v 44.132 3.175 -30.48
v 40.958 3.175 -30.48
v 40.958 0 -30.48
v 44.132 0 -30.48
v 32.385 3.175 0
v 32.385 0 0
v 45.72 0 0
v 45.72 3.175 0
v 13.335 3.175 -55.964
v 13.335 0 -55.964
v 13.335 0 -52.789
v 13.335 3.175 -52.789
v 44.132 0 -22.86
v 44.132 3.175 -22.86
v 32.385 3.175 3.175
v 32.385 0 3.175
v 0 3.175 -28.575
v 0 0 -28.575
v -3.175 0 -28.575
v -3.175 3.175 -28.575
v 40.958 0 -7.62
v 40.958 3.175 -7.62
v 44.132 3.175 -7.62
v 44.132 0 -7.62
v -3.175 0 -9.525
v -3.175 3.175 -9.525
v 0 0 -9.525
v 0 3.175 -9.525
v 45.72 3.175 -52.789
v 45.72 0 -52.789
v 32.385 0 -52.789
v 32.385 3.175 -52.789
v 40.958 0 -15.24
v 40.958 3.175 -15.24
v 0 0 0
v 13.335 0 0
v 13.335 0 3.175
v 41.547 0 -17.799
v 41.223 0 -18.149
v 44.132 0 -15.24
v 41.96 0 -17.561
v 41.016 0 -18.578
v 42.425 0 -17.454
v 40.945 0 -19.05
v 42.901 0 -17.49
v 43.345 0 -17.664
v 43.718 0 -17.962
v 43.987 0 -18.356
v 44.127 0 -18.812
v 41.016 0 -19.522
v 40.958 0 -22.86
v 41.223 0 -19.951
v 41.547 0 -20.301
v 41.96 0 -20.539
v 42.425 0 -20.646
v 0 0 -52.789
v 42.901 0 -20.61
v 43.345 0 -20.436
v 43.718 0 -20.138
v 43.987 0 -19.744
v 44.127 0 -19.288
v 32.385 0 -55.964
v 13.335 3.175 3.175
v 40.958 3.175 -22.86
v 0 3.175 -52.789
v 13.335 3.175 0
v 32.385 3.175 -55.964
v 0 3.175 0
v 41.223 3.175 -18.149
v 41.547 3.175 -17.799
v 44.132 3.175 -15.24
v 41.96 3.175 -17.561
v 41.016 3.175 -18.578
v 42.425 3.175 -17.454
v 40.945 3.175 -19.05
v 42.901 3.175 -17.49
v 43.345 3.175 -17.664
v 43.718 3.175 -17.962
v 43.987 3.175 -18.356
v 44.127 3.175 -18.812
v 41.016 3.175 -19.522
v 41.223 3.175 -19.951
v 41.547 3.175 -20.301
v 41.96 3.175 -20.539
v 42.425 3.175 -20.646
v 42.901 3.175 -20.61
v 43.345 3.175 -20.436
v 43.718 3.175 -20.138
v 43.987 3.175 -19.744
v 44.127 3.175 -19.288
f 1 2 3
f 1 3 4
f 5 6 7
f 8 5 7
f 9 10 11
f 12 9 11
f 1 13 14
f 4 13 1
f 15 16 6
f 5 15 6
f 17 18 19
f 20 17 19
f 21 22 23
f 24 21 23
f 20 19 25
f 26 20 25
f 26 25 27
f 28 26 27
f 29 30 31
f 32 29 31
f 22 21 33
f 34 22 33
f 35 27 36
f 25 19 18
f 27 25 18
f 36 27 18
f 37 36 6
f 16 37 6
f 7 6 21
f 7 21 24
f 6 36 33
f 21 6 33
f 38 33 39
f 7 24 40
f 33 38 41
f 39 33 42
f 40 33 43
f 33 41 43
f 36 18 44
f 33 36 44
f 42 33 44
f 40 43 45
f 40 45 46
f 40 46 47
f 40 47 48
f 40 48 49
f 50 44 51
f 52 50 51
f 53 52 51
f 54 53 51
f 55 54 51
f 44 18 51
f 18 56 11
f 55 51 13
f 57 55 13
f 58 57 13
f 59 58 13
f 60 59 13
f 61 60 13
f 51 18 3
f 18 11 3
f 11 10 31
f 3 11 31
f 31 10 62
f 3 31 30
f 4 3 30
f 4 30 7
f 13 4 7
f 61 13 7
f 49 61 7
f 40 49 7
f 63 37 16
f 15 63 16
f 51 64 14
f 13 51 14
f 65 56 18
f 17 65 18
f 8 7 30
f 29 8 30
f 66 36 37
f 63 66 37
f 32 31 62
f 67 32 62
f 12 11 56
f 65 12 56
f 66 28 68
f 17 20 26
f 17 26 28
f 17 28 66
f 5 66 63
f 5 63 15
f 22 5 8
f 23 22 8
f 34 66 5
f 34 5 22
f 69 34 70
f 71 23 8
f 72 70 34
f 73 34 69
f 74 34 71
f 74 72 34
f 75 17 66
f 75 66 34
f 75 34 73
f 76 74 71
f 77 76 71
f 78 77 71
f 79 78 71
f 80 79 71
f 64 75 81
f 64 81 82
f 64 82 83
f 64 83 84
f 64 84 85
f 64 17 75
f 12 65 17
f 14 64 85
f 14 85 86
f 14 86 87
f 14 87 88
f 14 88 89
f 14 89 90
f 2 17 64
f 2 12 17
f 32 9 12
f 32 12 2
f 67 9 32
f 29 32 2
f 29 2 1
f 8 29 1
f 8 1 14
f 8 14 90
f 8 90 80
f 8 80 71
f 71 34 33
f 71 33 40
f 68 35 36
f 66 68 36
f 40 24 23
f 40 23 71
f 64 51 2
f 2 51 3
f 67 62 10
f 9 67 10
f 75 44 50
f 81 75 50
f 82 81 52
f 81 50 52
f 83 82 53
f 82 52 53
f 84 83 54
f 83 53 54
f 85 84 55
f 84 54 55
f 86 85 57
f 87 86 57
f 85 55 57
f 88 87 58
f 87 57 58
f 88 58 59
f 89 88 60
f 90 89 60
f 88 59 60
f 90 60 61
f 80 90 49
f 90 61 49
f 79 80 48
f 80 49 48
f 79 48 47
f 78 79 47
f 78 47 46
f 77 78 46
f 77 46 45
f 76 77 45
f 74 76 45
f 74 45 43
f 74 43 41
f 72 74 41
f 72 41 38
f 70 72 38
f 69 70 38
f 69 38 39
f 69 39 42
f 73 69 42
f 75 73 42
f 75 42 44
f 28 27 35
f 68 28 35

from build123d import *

# Parameters (mm, degrees)
SKETCH1_W            = 3.175
SKETCH1_H            = 7.62
BOSS_EXTRUDE1_DEPTH  = 3.175
M3_CLEARANCE_HOLE1_D = 3.2


with BuildPart() as part:
    # Sketch1 → Boss-Extrude1 (new body)
    with BuildSketch(Plane(origin=(0, 0, 0), x_dir=(1, 0, 0), z_dir=(0, 1, 0))):
        Polygon((0, 0), (13.335, 0), (13.335, -3.175), (32.385, -3.175), (32.385, 0), (45.72, 0), (45.72, 52.78882), (32.385, 52.78882), (32.385, 55.96382), (13.335, 55.96382), (13.335, 52.78882), (0, 52.78882), (0, 28.575), (-3.175, 28.575), (-3.175, 9.525), (0, 9.525), align=None)
        with Locations((42.545, 26.67)):
            Rectangle(SKETCH1_W, SKETCH1_H, mode=Mode.SUBTRACT)
        with Locations((42.545, 11.43)):
            Rectangle(SKETCH1_W, SKETCH1_H, mode=Mode.SUBTRACT)
    extrude(amount=BOSS_EXTRUDE1_DEPTH)

    # M3 Clearance Hole1 (through all)
    with Locations(Plane(origin=(0, 3.175, 0), x_dir=(1, 0, 0), z_dir=(0, 1, 0))):
        with Locations((42.545, 19.05)):
            Hole(M3_CLEARANCE_HOLE1_D / 2)


solid = part.part
